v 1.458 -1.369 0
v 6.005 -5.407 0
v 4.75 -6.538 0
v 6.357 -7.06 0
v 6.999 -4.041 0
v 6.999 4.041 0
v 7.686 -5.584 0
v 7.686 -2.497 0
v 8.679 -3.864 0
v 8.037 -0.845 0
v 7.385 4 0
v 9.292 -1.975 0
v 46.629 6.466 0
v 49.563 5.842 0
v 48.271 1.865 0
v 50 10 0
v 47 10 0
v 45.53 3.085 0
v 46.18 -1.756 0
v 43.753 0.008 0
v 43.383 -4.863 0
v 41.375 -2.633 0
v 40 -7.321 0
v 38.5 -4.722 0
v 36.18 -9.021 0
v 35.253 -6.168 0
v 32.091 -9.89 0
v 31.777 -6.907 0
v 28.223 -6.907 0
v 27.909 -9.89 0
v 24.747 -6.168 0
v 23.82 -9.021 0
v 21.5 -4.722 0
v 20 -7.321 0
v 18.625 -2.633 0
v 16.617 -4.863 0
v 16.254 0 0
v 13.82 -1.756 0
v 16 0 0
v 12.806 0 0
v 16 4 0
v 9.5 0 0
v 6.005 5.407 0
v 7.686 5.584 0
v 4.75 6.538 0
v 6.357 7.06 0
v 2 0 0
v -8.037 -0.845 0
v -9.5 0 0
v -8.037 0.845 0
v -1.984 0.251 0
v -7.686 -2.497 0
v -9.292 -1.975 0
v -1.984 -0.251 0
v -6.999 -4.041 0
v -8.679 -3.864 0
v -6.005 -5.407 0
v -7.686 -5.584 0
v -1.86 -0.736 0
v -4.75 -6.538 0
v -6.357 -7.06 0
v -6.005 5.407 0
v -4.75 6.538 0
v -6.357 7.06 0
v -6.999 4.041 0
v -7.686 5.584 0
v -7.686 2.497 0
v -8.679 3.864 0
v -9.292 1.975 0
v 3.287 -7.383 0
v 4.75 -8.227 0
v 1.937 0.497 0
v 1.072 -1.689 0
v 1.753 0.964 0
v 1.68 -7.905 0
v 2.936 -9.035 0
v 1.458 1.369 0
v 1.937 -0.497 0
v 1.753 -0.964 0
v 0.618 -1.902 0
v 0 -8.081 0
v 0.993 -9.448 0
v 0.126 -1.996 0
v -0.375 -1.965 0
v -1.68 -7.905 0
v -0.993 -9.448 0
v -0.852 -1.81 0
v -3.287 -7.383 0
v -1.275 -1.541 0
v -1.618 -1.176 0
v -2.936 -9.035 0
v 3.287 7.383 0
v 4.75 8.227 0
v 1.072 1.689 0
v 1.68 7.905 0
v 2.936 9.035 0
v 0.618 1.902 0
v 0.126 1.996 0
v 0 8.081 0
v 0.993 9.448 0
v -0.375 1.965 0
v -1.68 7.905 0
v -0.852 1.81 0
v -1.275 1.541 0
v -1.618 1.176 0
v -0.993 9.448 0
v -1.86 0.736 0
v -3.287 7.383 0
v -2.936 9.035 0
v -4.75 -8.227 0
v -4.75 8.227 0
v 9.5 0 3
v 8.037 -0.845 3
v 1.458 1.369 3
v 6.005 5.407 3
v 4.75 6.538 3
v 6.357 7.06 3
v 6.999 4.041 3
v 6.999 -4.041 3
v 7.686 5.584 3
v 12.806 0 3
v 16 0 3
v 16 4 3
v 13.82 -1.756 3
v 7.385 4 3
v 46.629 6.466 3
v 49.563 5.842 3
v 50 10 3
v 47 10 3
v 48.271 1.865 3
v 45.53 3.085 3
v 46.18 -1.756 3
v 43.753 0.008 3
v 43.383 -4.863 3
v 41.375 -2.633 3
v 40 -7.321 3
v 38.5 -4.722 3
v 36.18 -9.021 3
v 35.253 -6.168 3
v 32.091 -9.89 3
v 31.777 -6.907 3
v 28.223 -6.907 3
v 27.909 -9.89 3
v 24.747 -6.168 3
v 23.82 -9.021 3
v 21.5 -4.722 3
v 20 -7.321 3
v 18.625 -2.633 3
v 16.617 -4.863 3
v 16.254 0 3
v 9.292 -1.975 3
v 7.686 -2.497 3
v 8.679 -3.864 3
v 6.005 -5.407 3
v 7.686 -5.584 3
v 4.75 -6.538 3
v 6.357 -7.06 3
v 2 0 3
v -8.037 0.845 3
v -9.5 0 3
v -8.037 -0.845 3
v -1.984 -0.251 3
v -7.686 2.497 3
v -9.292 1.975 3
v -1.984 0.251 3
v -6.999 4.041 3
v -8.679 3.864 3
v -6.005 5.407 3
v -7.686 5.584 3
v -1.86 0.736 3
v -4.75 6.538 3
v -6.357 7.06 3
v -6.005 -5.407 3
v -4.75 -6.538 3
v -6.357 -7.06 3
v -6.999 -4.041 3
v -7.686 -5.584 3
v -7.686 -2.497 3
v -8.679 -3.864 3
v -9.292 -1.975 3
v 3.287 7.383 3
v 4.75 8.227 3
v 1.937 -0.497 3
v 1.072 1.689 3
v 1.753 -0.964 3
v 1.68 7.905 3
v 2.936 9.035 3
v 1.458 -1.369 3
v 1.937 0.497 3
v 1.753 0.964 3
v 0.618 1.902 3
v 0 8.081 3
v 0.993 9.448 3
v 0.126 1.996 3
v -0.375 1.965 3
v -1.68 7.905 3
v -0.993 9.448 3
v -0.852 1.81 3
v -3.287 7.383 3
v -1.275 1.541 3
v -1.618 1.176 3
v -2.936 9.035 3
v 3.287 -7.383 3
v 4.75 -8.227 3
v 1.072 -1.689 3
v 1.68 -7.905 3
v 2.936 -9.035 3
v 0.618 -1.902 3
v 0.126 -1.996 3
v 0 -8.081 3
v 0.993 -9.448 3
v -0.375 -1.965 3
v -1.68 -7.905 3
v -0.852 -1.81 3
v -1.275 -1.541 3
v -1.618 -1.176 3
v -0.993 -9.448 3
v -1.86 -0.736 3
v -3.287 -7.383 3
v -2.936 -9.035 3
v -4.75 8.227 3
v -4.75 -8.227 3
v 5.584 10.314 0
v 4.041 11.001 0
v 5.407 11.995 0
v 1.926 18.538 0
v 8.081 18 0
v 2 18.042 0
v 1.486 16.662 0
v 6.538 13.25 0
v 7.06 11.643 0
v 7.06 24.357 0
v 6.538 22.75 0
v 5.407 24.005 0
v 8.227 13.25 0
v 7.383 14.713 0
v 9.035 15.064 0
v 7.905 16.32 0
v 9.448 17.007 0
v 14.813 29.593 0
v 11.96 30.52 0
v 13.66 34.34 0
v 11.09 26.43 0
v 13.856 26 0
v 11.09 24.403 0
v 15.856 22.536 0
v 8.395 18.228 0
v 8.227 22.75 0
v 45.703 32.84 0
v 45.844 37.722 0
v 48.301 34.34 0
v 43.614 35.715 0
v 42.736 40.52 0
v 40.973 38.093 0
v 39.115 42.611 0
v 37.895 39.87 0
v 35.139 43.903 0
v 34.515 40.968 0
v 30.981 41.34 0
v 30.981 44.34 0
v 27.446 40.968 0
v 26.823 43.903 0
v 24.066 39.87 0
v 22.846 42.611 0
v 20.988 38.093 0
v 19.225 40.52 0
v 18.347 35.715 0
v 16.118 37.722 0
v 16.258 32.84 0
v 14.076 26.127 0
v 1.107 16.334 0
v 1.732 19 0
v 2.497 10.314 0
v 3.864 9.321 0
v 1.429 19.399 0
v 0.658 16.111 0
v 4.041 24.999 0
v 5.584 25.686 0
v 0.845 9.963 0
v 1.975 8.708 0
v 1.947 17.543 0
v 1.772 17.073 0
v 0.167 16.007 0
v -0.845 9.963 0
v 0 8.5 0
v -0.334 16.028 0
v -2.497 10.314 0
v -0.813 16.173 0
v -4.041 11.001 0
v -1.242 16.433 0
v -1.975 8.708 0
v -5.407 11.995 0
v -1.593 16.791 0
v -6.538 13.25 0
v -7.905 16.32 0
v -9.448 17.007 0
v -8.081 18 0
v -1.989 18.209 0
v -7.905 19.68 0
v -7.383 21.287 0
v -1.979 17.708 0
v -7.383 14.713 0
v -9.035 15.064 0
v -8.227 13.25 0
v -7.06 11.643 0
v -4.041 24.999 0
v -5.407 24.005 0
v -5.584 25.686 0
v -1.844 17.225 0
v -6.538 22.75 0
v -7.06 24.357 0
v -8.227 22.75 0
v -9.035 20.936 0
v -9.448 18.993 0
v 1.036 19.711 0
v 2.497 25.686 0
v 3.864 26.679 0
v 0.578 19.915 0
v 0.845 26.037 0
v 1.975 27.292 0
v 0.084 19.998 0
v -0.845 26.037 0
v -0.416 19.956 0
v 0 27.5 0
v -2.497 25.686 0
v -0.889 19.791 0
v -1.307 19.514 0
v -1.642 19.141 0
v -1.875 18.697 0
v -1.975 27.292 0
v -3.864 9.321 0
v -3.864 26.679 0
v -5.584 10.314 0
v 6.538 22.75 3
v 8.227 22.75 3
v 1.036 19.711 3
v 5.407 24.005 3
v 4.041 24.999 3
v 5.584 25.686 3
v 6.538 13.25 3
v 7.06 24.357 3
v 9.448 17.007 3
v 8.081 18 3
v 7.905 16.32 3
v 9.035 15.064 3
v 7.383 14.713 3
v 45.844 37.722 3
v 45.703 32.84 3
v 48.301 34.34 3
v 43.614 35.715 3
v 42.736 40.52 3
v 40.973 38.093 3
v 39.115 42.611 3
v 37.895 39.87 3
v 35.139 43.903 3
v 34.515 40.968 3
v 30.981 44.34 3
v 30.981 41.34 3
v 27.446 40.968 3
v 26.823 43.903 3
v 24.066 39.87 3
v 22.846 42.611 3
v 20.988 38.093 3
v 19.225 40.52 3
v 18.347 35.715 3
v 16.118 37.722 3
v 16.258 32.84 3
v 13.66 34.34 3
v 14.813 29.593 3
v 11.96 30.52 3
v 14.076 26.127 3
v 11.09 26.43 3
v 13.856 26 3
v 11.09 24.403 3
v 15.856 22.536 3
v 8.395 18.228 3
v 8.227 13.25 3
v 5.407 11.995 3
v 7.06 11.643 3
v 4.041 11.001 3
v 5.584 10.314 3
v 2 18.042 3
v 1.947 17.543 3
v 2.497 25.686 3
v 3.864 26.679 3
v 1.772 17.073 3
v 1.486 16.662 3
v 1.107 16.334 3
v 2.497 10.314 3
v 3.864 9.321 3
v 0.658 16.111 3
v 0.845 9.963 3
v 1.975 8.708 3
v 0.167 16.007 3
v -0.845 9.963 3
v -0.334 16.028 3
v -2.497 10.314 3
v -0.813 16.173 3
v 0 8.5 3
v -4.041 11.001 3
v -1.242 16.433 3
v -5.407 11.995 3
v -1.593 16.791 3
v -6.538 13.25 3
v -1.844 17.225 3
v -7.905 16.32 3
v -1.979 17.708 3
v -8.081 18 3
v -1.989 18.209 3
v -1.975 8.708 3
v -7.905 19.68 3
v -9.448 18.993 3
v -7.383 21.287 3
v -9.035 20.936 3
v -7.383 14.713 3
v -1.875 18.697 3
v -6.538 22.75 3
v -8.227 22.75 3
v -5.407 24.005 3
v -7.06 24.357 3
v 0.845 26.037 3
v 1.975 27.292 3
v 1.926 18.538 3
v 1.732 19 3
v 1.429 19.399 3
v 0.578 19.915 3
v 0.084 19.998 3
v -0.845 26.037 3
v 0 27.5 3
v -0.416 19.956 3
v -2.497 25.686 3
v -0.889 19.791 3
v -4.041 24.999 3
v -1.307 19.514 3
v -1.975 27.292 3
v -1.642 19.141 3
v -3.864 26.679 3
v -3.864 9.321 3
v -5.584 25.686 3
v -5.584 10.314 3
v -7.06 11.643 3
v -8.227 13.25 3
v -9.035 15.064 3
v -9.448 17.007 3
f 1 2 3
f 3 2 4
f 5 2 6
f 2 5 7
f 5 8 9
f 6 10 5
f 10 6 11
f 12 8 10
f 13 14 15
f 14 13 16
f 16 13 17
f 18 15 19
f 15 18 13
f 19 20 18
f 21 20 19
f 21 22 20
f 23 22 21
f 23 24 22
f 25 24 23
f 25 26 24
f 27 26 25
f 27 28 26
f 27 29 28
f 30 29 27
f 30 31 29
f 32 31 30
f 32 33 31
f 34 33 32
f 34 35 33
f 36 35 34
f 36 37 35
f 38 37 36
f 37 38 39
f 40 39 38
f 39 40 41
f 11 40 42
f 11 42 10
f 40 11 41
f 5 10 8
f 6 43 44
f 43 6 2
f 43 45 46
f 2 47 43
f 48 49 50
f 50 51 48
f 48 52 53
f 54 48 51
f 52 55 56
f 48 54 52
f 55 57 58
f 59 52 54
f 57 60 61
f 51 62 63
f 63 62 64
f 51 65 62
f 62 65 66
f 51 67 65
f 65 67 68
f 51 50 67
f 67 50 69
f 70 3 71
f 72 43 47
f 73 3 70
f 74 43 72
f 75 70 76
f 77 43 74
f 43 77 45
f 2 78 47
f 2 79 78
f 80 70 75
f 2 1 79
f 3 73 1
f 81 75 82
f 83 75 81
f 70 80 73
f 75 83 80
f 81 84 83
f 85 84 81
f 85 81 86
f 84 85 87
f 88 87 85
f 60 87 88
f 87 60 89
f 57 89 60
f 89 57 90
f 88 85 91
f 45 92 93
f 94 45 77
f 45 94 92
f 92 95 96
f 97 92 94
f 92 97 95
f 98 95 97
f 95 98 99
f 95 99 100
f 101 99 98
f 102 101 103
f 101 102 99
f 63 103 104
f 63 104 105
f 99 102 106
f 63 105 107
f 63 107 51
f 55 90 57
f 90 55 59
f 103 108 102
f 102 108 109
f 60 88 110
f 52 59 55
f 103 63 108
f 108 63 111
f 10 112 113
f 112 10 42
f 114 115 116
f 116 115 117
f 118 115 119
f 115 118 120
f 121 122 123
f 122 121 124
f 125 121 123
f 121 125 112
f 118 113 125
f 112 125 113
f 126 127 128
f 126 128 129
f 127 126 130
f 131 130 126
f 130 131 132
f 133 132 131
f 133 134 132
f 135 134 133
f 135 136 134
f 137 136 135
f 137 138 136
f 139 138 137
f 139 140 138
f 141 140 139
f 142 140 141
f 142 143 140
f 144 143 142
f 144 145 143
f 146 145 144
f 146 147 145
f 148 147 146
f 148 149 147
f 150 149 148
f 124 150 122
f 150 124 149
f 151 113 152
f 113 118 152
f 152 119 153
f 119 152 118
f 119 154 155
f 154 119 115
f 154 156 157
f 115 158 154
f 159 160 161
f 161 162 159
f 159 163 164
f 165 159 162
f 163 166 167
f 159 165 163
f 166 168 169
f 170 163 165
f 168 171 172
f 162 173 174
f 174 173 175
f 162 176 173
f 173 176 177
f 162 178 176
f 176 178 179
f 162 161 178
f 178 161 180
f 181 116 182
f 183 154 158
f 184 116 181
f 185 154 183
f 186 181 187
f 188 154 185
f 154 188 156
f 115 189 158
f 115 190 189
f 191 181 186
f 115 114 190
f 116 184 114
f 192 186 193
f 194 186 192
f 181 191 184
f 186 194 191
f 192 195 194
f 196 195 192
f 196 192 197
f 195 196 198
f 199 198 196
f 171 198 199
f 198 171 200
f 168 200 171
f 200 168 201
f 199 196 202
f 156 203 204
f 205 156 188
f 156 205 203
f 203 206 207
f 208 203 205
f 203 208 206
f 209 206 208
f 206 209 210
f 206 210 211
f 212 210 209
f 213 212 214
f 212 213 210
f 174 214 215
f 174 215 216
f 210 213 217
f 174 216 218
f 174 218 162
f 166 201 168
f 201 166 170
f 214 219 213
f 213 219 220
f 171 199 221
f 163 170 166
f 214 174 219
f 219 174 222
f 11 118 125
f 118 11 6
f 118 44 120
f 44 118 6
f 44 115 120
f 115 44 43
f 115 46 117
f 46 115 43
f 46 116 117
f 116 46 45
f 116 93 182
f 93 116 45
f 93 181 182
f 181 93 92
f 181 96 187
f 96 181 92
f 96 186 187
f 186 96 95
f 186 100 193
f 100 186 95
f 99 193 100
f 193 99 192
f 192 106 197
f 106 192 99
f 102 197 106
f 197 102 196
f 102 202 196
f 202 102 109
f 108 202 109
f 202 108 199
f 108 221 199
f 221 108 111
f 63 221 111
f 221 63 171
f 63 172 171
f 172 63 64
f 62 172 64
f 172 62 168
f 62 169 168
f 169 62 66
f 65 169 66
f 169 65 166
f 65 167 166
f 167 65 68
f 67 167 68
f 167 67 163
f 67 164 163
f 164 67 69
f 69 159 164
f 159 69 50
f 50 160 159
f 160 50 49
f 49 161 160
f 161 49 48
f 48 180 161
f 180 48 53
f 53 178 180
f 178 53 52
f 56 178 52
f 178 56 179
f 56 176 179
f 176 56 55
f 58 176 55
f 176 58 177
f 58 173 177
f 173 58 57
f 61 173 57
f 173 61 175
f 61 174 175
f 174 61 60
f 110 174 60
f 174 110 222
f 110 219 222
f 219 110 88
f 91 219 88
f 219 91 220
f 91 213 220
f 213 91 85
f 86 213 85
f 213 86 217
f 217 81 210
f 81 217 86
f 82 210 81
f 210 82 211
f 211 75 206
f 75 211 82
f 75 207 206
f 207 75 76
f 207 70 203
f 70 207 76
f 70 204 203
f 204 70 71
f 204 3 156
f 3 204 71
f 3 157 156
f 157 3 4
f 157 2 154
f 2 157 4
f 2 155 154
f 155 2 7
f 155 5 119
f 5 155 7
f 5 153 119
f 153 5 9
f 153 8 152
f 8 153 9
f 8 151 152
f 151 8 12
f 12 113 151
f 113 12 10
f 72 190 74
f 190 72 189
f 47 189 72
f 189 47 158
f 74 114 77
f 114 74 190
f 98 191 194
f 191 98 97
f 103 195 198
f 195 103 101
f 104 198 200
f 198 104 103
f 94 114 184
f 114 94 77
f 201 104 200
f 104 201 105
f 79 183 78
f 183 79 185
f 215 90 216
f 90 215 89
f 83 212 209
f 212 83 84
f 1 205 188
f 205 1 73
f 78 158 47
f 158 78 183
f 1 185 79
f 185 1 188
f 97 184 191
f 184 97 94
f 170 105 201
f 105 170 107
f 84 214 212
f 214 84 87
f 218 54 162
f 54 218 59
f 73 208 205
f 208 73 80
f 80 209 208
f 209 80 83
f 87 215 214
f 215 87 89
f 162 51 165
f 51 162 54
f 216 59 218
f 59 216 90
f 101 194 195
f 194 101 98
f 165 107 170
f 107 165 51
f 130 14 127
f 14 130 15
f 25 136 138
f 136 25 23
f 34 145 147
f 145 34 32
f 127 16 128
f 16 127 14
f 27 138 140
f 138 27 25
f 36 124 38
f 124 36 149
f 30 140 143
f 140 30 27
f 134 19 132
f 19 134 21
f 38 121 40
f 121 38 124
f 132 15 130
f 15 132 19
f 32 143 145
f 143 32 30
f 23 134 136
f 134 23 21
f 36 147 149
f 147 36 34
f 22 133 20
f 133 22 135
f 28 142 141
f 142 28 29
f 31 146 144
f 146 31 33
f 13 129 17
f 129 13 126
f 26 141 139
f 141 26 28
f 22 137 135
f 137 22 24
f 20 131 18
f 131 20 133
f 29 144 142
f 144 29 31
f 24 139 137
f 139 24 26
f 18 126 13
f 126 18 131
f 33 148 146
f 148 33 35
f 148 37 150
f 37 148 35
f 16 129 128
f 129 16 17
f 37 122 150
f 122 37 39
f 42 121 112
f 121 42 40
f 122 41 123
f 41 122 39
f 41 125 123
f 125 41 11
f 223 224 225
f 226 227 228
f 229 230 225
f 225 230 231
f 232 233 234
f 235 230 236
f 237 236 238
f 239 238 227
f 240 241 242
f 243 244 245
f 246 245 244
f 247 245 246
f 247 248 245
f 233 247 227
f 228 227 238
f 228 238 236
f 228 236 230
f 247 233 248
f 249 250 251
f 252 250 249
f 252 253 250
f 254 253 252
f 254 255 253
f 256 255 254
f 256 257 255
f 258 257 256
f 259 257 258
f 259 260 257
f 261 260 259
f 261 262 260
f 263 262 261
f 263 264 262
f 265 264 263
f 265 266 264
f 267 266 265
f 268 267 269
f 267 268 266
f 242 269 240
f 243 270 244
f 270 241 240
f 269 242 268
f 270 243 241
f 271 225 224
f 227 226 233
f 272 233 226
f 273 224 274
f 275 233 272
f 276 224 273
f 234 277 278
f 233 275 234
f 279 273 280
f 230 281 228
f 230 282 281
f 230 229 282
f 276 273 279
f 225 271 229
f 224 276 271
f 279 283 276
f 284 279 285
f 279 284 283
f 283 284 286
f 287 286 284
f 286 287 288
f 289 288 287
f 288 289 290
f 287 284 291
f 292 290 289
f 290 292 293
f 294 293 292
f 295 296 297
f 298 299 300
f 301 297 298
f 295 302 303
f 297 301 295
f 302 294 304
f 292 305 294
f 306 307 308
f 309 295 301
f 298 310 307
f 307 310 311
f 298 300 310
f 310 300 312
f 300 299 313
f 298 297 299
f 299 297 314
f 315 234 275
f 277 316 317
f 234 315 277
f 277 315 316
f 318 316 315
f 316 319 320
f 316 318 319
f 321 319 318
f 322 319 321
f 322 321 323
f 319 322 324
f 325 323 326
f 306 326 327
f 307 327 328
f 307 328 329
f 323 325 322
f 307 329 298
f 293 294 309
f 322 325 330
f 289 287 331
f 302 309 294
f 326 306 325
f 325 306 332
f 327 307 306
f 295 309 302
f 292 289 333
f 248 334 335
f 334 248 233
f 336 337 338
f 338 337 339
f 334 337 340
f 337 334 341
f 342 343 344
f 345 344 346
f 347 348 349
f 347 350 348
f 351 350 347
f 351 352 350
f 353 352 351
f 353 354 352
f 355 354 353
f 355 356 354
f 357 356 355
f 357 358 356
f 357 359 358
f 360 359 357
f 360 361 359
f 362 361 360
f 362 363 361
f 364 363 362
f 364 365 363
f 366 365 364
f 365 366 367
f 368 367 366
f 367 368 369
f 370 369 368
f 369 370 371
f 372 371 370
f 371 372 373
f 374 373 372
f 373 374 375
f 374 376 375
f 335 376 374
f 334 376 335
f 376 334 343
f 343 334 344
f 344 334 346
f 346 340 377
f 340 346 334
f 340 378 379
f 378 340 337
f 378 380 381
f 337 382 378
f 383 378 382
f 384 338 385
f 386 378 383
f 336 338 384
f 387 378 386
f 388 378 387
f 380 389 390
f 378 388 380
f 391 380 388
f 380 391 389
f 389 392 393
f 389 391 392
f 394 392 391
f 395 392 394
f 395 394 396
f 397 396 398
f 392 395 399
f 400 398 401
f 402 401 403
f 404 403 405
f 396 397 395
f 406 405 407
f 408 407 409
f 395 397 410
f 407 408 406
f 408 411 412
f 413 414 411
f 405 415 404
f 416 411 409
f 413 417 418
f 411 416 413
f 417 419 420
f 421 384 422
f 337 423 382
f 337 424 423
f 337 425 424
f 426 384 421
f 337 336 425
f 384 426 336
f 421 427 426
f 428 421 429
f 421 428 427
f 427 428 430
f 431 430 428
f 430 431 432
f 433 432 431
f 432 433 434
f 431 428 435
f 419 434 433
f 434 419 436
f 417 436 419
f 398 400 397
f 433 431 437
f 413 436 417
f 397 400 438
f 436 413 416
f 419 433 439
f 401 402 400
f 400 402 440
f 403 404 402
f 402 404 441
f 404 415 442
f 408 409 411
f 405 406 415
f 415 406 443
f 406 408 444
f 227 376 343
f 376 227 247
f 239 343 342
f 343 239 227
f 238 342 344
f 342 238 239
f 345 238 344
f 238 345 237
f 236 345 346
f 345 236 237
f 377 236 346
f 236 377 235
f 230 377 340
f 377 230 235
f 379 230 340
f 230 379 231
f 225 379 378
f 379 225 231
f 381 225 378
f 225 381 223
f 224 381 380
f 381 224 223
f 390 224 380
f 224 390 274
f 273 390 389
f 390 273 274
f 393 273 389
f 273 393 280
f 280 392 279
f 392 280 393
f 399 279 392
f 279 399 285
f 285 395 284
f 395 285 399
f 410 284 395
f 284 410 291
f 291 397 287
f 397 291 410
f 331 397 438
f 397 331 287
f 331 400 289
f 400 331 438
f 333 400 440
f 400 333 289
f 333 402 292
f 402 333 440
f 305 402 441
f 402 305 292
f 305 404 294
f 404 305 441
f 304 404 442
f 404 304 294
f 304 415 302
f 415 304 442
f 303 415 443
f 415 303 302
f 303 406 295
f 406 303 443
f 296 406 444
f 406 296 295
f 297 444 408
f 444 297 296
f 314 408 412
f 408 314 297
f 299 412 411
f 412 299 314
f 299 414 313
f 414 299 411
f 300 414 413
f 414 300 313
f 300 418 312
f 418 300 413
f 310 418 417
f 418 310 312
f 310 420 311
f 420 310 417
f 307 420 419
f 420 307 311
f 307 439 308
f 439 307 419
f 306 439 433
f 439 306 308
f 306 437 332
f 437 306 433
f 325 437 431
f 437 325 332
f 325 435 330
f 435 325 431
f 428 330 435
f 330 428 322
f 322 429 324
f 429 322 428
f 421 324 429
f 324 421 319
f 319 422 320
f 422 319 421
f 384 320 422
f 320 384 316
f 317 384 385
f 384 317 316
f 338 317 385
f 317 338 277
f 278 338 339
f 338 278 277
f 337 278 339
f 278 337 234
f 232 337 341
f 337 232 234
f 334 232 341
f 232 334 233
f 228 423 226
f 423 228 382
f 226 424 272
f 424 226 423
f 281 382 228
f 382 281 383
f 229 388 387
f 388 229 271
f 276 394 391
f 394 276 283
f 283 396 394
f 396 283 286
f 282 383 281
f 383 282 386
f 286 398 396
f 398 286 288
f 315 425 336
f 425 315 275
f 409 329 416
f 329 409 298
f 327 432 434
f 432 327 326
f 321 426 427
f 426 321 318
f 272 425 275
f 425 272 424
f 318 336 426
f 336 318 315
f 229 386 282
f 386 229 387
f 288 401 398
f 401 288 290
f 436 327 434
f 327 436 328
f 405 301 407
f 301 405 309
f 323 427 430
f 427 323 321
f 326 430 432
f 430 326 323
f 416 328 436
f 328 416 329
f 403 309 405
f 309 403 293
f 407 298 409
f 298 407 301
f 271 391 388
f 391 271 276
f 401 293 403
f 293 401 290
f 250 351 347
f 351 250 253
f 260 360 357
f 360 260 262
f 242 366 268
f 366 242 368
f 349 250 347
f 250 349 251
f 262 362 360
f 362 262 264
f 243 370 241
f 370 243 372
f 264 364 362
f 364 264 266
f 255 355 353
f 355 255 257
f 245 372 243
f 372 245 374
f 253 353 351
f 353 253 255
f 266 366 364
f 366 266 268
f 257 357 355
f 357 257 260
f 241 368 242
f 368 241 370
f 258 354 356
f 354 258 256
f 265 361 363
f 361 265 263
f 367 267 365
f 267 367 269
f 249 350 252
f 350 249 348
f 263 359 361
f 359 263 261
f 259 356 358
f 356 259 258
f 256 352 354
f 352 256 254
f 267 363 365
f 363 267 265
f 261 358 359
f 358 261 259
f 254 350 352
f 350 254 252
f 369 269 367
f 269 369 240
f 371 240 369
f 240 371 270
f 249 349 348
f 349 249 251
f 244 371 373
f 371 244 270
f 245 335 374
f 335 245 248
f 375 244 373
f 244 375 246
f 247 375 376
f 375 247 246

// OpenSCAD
module jaw() {
    for(i=[0:1:30]){  // 30 Zähne für gleichmäßige Verteilung
        rotate([0,0,(360/30)*i])
        translate([7.5,0])  // 7.5 mm für Radius (Durchmesser 15 mm)
            linear_extrude(3)
                circle(2,$fn=3); // Kleinere Dreiecke für schärfere Zähne
    }

    difference() {
      cylinder(h=3,r=8);
      translate([0,0,-1]) cylinder(h=5,r=2,$fn=25);
    }
    translate([6,0,0]) cube([10,4,3]);

    difference() {
        union() {
            translate([30,10,0]) cylinder(h=3,r=20);
            
        }
        translate([30,10,-1]) cylinder(h=5,r=17);
        translate([10,10,-1]) cube([40,20,5]);
        translate([10,0,-1]) cube([15,15,5]);
    }
}

jaw();
translate([0,18,0]) mirror([0,1,0]) rotate([0,0,-30]) jaw();
